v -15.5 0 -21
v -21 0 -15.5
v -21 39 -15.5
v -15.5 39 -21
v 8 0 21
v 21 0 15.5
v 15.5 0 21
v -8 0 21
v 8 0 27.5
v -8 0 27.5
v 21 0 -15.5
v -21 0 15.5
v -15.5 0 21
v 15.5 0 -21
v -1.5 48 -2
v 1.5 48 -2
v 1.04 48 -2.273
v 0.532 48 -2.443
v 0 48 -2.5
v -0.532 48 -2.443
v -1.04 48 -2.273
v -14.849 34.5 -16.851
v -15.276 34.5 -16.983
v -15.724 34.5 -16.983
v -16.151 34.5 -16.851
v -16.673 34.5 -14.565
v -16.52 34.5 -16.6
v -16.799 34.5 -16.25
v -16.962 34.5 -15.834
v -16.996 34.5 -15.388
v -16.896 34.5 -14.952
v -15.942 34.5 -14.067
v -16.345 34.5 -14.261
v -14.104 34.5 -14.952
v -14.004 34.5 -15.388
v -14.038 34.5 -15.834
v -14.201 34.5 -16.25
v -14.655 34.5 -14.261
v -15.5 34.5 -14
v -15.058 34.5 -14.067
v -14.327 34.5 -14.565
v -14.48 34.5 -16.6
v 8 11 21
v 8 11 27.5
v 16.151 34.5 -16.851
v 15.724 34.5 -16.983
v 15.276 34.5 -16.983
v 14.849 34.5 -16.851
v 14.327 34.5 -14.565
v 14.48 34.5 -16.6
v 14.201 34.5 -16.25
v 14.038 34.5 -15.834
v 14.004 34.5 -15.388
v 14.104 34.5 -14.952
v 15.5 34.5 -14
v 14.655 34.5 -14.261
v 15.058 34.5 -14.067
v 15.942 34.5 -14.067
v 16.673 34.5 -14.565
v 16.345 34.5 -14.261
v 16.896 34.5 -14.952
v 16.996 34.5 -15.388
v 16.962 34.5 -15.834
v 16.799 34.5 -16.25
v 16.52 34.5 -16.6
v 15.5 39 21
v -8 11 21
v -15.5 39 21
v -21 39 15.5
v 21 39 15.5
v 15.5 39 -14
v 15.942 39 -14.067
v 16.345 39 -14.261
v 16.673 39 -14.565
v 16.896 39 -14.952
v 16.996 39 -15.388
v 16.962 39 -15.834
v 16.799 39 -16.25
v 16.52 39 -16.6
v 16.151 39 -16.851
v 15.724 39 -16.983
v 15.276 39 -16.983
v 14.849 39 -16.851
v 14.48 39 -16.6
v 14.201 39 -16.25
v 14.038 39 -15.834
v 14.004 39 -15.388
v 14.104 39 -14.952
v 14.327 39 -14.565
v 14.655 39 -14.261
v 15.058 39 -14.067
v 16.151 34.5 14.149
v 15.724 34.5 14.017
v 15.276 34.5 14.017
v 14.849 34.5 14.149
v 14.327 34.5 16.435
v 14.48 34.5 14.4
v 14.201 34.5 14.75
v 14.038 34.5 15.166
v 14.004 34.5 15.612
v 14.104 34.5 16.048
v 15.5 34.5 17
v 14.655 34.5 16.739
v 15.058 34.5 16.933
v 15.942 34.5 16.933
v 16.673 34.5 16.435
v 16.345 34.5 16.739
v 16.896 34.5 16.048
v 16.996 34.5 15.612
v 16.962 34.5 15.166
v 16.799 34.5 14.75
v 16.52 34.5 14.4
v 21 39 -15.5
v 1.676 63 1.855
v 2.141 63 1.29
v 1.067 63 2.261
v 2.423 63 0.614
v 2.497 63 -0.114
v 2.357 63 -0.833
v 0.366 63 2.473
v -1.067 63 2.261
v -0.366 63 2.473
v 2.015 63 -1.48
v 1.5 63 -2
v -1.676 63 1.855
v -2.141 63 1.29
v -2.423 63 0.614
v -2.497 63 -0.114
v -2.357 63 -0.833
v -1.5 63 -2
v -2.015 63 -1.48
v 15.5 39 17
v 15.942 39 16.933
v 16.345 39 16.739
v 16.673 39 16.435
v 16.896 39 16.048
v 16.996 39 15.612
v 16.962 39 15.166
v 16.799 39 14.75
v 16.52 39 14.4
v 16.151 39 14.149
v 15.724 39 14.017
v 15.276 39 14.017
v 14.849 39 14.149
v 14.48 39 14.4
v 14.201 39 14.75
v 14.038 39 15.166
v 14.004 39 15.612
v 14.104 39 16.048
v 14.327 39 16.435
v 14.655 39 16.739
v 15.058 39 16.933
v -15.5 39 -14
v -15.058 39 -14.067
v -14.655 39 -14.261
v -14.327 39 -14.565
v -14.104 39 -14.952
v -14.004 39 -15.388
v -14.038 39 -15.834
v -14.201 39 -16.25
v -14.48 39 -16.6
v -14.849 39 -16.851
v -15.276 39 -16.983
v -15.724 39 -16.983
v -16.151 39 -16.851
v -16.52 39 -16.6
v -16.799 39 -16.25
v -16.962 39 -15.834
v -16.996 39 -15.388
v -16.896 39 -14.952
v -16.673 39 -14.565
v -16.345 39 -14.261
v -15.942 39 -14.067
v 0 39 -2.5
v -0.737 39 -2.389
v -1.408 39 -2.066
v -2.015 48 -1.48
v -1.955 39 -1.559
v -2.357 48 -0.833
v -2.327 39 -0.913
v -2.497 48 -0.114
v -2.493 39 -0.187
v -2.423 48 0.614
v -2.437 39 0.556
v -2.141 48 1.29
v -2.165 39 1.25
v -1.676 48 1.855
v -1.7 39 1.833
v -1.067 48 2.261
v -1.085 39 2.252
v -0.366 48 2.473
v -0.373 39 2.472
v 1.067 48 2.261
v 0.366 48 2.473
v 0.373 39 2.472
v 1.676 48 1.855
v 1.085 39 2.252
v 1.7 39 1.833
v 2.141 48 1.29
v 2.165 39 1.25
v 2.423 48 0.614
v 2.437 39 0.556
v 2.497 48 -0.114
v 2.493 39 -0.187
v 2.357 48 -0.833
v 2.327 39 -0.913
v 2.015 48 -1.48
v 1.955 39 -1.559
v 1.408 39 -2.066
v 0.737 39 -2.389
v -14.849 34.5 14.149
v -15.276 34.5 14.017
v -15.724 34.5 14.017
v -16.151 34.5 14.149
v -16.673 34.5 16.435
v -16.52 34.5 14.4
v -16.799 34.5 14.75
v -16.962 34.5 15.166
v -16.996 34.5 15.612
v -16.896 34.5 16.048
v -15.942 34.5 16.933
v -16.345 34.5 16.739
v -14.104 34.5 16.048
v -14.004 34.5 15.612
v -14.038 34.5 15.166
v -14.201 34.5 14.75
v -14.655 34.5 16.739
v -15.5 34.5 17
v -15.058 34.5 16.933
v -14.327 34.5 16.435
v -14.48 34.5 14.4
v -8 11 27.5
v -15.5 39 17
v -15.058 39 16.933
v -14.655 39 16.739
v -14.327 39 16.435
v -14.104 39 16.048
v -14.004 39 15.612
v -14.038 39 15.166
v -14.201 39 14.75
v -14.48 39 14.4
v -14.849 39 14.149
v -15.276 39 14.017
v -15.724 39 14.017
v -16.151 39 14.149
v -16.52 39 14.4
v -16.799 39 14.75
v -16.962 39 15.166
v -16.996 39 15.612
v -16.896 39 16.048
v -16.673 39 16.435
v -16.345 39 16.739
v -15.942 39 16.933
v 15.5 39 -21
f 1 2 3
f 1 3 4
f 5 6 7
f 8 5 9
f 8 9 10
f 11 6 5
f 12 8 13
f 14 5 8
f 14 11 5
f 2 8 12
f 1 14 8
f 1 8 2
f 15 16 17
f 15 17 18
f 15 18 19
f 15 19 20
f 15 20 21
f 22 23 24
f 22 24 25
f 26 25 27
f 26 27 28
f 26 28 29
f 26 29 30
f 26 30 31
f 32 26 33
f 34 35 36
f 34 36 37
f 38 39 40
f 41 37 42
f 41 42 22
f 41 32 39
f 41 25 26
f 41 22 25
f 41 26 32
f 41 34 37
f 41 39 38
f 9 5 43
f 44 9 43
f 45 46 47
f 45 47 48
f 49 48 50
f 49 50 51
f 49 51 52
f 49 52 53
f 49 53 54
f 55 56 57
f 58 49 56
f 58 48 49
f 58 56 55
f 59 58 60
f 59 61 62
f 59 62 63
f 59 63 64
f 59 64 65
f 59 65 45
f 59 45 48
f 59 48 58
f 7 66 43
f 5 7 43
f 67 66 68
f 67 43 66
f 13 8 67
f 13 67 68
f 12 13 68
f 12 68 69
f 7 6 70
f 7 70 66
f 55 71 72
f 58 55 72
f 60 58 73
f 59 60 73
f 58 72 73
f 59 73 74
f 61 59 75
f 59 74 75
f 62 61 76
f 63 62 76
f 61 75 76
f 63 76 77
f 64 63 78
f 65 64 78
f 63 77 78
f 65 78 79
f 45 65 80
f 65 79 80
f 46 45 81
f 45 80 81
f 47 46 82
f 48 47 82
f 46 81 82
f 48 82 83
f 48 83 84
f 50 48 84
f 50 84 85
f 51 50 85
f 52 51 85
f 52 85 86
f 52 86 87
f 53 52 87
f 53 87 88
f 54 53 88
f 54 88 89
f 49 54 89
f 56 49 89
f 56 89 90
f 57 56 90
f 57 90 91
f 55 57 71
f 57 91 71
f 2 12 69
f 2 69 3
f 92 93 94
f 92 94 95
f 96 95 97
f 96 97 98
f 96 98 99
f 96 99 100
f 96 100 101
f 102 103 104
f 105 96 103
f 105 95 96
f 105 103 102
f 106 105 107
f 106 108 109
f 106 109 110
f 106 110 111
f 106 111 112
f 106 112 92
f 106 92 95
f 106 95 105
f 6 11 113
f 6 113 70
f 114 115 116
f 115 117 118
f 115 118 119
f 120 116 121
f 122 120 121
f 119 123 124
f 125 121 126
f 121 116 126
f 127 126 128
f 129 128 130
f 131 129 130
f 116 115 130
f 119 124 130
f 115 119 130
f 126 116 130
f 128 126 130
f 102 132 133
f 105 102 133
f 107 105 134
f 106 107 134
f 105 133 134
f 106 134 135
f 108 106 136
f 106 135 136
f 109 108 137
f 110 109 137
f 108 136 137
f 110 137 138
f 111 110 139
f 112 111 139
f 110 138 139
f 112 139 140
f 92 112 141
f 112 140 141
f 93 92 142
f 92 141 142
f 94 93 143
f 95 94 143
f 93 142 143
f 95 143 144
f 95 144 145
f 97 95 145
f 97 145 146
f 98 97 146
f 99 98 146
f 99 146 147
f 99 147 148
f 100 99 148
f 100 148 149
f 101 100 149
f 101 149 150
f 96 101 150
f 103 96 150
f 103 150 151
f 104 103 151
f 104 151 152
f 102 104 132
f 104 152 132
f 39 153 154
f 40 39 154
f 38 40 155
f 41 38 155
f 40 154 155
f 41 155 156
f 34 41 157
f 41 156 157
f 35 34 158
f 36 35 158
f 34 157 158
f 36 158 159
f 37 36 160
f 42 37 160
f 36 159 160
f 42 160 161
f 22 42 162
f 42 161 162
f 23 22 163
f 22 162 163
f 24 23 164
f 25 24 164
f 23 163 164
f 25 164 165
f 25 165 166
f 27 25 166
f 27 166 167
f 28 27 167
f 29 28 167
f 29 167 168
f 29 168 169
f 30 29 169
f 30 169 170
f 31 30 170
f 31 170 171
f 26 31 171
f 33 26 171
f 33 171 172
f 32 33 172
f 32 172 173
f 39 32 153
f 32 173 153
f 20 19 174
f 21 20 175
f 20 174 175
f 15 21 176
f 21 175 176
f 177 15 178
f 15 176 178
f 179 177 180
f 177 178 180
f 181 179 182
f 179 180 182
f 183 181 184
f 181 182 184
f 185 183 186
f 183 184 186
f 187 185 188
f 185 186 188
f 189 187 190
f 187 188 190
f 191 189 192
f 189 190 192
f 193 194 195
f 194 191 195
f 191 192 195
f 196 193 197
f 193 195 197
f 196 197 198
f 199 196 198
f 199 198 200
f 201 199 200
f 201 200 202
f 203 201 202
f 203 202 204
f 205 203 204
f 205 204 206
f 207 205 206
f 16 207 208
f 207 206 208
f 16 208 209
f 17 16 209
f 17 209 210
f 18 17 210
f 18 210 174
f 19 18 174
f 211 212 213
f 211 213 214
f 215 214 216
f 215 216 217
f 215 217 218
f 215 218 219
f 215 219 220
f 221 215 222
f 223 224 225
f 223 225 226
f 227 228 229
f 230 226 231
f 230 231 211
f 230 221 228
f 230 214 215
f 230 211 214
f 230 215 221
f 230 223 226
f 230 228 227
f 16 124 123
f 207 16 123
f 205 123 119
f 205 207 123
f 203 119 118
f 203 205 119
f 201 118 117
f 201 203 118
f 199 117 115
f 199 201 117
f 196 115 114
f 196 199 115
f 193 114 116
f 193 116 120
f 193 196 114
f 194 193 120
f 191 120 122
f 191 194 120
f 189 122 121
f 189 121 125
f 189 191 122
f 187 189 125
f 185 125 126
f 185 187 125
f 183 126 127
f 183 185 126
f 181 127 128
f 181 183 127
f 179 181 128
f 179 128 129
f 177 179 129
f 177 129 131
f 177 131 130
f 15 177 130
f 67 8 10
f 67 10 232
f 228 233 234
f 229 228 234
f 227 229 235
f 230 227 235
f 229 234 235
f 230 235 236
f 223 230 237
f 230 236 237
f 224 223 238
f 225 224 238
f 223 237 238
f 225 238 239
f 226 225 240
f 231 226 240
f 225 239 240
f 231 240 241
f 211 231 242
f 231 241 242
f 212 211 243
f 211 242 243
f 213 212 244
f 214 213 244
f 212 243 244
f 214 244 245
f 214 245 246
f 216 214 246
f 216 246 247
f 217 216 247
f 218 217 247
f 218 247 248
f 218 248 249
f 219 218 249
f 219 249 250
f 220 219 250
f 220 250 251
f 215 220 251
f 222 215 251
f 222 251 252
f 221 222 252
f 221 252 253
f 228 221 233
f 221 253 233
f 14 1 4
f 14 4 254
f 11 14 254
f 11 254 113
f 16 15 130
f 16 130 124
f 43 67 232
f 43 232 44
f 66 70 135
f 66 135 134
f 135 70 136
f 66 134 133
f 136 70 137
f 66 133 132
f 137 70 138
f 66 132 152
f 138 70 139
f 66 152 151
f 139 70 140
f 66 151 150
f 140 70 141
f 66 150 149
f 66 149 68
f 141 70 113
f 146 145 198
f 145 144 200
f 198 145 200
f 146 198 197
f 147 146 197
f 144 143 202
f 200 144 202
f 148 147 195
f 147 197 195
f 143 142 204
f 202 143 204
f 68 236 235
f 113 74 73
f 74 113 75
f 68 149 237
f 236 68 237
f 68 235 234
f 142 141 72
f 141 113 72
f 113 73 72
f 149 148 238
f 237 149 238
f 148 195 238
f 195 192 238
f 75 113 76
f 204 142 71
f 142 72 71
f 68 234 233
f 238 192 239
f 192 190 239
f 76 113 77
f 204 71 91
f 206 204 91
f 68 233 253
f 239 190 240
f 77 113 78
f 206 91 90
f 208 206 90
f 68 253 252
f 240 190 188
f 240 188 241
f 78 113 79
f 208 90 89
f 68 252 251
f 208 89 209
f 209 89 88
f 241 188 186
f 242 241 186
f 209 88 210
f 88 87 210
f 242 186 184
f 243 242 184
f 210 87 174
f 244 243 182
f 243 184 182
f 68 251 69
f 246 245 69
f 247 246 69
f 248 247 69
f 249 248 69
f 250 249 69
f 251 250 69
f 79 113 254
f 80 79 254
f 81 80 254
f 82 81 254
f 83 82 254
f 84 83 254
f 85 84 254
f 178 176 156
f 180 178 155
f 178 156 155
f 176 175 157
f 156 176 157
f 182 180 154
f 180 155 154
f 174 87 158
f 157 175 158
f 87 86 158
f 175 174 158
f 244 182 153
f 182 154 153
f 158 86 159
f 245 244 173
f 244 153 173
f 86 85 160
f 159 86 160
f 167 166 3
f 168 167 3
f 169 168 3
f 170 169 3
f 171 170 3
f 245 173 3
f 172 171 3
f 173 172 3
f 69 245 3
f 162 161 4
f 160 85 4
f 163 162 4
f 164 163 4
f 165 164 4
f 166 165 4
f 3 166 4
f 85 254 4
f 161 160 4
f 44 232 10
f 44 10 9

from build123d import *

# Parameters (mm, degrees)
BOSS_EXTRUDE1_DEPTH = 39
SKETCH2_R           = 2.5
BOSS_EXTRUDE2_DEPTH = 9
BOSS_EXTRUDE3_DEPTH = 15
SKETCH4_R           = 1.5
CUT_EXTRUDE1_DEPTH  = 4.5
SKETCH5_W           = 16
SKETCH5_H           = 11
BOSS_EXTRUDE4_DEPTH = 6.5


with BuildPart() as part:
    # Sketch1 → Boss-Extrude1 (new body)
    with BuildSketch(Plane(origin=(0, 0, 0), x_dir=(1, 0, 0), z_dir=(0, 1, 0))):
        Polygon((-21, 15.5), (-15.5, 21), (15.5, 21), (21, 15.5), (21, -15.5), (15.5, -21), (-15.5, -21), (-21, -15.5), align=None)
    extrude(amount=BOSS_EXTRUDE1_DEPTH)

    # Sketch2 → Boss-Extrude2 (add)
    with BuildSketch(Plane(origin=(0, 39, 0), x_dir=(1, 0, 0), z_dir=(0, 1, 0))):
        with Locations(Location((0, 0, 0), (0, 0, 90))):
            Circle(SKETCH2_R)
    extrude(amount=BOSS_EXTRUDE2_DEPTH)

    # Sketch3 → Boss-Extrude3 (add)
    with BuildSketch(Plane(origin=(0, 48, 0), x_dir=(1, 0, 0), z_dir=(0, 1, 0))):
        with BuildLine():
            Line((-1.5, 2), (1.5, 2))
            ThreePointArc((1.5, 2), (0, -2.5), (-1.5, 2))
        make_face()
    extrude(amount=BOSS_EXTRUDE3_DEPTH)

    # Sketch4 → Cut-Extrude1 (cut)
    with BuildSketch(Plane(origin=(0, 39, 0), x_dir=(1, 0, 0), z_dir=(0, 1, 0))):
        with Locations(Location((-15.5, 15.5, 0), (0, 0, 270))):
            Circle(SKETCH4_R)
        with Locations(Location((15.5, 15.5, 0), (0, 0, 270))):
            Circle(SKETCH4_R)
        with Locations(Location((15.5, -15.5, 0), (0, 0, 270))):
            Circle(SKETCH4_R)
        with Locations(Location((-15.5, -15.5, 0), (0, 0, 270))):
            Circle(SKETCH4_R)
    extrude(amount=-CUT_EXTRUDE1_DEPTH, mode=Mode.SUBTRACT)

    # Sketch5 → Boss-Extrude4 (add)
    with BuildSketch(Plane.XY.offset(21)):
        with Locations((0, 5.5)):
            Rectangle(SKETCH5_W, SKETCH5_H)
    extrude(amount=BOSS_EXTRUDE4_DEPTH)


solid = part.part
